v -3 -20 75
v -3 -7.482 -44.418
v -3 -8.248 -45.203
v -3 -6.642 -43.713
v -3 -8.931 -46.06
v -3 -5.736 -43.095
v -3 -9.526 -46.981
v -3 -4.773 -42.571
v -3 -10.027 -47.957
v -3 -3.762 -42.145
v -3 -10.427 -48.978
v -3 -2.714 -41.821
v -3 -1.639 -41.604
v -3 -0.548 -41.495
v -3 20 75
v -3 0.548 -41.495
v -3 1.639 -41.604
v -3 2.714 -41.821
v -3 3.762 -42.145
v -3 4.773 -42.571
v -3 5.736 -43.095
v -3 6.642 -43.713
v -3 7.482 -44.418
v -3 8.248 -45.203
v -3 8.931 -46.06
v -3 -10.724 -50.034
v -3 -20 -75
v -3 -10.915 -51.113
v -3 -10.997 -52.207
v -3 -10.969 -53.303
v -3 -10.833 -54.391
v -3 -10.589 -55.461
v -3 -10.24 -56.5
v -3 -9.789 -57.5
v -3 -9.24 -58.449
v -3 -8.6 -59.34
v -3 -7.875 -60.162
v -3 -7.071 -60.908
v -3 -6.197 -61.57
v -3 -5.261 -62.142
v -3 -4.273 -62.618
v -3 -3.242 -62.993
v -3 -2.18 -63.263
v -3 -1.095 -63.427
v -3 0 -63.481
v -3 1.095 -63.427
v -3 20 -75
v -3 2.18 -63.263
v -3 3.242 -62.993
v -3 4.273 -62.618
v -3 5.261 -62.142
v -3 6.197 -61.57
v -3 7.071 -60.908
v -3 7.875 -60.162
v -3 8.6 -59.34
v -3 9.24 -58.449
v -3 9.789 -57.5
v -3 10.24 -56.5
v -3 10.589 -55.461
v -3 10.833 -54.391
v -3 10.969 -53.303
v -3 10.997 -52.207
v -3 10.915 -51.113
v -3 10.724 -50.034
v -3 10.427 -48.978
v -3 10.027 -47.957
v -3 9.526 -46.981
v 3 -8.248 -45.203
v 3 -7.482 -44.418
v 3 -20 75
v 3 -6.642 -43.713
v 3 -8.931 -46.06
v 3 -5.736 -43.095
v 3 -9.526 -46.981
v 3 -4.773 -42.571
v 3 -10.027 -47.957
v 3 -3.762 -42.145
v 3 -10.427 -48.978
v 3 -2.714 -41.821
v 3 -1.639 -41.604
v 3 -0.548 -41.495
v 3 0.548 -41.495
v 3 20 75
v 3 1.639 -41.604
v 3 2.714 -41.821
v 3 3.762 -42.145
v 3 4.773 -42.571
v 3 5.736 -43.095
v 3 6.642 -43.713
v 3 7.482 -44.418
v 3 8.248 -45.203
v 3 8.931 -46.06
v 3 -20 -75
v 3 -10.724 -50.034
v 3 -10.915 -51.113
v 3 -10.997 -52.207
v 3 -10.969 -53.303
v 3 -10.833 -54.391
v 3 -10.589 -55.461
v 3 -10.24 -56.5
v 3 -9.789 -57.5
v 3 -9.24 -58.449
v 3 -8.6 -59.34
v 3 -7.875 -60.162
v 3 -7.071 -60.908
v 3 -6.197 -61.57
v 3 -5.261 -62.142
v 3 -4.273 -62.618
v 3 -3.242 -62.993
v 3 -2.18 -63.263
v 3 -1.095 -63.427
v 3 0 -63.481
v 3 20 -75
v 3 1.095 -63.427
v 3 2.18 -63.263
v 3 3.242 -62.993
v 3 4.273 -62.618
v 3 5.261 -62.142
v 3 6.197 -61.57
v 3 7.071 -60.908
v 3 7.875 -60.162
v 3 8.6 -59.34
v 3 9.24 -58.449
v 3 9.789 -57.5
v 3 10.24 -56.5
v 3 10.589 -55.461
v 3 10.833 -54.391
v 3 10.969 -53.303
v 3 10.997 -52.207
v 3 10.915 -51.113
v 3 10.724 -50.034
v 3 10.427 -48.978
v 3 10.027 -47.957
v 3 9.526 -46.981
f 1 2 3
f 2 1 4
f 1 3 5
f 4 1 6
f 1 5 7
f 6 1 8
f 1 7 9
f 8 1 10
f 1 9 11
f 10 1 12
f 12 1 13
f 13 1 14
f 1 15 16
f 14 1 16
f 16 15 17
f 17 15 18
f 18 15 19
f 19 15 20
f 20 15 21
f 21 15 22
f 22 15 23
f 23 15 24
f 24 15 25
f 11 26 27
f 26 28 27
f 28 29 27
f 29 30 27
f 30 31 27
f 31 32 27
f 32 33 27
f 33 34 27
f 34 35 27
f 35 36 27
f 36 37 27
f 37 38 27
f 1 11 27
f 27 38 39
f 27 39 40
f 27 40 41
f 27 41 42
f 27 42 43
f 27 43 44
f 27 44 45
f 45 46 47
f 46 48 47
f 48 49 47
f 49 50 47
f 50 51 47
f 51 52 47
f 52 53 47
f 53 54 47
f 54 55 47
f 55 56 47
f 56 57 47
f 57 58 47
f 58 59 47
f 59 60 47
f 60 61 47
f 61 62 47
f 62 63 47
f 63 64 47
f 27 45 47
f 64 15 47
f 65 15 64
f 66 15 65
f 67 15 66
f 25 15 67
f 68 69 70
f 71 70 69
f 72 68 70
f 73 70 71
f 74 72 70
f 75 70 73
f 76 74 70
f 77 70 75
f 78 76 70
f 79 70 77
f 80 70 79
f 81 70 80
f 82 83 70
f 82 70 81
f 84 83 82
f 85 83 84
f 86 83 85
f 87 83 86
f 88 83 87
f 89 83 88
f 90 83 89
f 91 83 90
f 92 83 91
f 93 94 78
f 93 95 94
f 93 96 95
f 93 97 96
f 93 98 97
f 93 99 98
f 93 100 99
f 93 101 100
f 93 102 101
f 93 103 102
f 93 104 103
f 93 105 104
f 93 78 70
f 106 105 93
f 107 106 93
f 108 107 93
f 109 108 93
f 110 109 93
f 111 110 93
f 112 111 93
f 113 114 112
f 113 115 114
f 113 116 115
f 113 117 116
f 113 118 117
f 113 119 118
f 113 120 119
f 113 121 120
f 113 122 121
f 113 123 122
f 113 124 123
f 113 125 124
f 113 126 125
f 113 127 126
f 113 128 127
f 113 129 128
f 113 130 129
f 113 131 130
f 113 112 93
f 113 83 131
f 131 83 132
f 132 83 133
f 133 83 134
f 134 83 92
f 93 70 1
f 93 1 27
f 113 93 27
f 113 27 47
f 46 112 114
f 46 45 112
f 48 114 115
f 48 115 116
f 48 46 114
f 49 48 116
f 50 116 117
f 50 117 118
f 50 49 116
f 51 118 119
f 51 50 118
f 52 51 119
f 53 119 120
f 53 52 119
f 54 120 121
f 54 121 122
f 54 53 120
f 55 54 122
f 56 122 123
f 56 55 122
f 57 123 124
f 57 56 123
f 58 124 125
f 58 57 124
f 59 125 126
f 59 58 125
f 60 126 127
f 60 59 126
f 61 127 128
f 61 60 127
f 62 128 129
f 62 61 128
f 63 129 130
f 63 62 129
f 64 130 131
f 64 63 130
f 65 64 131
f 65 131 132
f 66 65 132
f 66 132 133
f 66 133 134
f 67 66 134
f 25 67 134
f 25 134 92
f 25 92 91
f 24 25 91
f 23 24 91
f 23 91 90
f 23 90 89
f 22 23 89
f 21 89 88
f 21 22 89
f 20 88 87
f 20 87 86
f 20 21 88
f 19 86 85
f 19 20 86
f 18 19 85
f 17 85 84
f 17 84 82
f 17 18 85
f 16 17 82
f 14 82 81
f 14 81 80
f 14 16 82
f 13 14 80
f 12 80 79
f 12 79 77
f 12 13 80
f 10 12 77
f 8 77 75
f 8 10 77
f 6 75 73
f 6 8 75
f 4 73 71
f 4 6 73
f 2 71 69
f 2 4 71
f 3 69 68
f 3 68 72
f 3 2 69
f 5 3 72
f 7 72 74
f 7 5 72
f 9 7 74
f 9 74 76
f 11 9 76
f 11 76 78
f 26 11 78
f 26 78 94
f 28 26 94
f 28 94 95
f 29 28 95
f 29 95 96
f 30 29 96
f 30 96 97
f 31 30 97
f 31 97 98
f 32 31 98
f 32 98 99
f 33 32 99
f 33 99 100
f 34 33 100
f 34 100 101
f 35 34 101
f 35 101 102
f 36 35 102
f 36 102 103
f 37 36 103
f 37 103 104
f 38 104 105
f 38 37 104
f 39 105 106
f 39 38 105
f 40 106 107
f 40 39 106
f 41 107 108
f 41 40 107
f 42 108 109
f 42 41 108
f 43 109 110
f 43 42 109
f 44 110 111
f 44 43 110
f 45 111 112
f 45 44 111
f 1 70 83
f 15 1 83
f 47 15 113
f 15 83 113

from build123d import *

# Parameters (mm, degrees)
SKETCH1_W           = 150
SKETCH1_H           = 40
SKETCH1_R           = 11
BOSS_EXTRUDE1_DEPTH = 3


with BuildPart() as part:
    # Sketch1 → Boss-Extrude1 (new, symmetric)
    with BuildSketch(Plane(origin=(0, 0, 0), x_dir=(0, 0, -1), z_dir=(1, 0, 0))):
        Rectangle(SKETCH1_W, SKETCH1_H)
        with Locations((52.481264033, 0)):
            Circle(SKETCH1_R, mode=Mode.SUBTRACT)
    extrude(amount=BOSS_EXTRUDE1_DEPTH, both=True)


solid = part.part
